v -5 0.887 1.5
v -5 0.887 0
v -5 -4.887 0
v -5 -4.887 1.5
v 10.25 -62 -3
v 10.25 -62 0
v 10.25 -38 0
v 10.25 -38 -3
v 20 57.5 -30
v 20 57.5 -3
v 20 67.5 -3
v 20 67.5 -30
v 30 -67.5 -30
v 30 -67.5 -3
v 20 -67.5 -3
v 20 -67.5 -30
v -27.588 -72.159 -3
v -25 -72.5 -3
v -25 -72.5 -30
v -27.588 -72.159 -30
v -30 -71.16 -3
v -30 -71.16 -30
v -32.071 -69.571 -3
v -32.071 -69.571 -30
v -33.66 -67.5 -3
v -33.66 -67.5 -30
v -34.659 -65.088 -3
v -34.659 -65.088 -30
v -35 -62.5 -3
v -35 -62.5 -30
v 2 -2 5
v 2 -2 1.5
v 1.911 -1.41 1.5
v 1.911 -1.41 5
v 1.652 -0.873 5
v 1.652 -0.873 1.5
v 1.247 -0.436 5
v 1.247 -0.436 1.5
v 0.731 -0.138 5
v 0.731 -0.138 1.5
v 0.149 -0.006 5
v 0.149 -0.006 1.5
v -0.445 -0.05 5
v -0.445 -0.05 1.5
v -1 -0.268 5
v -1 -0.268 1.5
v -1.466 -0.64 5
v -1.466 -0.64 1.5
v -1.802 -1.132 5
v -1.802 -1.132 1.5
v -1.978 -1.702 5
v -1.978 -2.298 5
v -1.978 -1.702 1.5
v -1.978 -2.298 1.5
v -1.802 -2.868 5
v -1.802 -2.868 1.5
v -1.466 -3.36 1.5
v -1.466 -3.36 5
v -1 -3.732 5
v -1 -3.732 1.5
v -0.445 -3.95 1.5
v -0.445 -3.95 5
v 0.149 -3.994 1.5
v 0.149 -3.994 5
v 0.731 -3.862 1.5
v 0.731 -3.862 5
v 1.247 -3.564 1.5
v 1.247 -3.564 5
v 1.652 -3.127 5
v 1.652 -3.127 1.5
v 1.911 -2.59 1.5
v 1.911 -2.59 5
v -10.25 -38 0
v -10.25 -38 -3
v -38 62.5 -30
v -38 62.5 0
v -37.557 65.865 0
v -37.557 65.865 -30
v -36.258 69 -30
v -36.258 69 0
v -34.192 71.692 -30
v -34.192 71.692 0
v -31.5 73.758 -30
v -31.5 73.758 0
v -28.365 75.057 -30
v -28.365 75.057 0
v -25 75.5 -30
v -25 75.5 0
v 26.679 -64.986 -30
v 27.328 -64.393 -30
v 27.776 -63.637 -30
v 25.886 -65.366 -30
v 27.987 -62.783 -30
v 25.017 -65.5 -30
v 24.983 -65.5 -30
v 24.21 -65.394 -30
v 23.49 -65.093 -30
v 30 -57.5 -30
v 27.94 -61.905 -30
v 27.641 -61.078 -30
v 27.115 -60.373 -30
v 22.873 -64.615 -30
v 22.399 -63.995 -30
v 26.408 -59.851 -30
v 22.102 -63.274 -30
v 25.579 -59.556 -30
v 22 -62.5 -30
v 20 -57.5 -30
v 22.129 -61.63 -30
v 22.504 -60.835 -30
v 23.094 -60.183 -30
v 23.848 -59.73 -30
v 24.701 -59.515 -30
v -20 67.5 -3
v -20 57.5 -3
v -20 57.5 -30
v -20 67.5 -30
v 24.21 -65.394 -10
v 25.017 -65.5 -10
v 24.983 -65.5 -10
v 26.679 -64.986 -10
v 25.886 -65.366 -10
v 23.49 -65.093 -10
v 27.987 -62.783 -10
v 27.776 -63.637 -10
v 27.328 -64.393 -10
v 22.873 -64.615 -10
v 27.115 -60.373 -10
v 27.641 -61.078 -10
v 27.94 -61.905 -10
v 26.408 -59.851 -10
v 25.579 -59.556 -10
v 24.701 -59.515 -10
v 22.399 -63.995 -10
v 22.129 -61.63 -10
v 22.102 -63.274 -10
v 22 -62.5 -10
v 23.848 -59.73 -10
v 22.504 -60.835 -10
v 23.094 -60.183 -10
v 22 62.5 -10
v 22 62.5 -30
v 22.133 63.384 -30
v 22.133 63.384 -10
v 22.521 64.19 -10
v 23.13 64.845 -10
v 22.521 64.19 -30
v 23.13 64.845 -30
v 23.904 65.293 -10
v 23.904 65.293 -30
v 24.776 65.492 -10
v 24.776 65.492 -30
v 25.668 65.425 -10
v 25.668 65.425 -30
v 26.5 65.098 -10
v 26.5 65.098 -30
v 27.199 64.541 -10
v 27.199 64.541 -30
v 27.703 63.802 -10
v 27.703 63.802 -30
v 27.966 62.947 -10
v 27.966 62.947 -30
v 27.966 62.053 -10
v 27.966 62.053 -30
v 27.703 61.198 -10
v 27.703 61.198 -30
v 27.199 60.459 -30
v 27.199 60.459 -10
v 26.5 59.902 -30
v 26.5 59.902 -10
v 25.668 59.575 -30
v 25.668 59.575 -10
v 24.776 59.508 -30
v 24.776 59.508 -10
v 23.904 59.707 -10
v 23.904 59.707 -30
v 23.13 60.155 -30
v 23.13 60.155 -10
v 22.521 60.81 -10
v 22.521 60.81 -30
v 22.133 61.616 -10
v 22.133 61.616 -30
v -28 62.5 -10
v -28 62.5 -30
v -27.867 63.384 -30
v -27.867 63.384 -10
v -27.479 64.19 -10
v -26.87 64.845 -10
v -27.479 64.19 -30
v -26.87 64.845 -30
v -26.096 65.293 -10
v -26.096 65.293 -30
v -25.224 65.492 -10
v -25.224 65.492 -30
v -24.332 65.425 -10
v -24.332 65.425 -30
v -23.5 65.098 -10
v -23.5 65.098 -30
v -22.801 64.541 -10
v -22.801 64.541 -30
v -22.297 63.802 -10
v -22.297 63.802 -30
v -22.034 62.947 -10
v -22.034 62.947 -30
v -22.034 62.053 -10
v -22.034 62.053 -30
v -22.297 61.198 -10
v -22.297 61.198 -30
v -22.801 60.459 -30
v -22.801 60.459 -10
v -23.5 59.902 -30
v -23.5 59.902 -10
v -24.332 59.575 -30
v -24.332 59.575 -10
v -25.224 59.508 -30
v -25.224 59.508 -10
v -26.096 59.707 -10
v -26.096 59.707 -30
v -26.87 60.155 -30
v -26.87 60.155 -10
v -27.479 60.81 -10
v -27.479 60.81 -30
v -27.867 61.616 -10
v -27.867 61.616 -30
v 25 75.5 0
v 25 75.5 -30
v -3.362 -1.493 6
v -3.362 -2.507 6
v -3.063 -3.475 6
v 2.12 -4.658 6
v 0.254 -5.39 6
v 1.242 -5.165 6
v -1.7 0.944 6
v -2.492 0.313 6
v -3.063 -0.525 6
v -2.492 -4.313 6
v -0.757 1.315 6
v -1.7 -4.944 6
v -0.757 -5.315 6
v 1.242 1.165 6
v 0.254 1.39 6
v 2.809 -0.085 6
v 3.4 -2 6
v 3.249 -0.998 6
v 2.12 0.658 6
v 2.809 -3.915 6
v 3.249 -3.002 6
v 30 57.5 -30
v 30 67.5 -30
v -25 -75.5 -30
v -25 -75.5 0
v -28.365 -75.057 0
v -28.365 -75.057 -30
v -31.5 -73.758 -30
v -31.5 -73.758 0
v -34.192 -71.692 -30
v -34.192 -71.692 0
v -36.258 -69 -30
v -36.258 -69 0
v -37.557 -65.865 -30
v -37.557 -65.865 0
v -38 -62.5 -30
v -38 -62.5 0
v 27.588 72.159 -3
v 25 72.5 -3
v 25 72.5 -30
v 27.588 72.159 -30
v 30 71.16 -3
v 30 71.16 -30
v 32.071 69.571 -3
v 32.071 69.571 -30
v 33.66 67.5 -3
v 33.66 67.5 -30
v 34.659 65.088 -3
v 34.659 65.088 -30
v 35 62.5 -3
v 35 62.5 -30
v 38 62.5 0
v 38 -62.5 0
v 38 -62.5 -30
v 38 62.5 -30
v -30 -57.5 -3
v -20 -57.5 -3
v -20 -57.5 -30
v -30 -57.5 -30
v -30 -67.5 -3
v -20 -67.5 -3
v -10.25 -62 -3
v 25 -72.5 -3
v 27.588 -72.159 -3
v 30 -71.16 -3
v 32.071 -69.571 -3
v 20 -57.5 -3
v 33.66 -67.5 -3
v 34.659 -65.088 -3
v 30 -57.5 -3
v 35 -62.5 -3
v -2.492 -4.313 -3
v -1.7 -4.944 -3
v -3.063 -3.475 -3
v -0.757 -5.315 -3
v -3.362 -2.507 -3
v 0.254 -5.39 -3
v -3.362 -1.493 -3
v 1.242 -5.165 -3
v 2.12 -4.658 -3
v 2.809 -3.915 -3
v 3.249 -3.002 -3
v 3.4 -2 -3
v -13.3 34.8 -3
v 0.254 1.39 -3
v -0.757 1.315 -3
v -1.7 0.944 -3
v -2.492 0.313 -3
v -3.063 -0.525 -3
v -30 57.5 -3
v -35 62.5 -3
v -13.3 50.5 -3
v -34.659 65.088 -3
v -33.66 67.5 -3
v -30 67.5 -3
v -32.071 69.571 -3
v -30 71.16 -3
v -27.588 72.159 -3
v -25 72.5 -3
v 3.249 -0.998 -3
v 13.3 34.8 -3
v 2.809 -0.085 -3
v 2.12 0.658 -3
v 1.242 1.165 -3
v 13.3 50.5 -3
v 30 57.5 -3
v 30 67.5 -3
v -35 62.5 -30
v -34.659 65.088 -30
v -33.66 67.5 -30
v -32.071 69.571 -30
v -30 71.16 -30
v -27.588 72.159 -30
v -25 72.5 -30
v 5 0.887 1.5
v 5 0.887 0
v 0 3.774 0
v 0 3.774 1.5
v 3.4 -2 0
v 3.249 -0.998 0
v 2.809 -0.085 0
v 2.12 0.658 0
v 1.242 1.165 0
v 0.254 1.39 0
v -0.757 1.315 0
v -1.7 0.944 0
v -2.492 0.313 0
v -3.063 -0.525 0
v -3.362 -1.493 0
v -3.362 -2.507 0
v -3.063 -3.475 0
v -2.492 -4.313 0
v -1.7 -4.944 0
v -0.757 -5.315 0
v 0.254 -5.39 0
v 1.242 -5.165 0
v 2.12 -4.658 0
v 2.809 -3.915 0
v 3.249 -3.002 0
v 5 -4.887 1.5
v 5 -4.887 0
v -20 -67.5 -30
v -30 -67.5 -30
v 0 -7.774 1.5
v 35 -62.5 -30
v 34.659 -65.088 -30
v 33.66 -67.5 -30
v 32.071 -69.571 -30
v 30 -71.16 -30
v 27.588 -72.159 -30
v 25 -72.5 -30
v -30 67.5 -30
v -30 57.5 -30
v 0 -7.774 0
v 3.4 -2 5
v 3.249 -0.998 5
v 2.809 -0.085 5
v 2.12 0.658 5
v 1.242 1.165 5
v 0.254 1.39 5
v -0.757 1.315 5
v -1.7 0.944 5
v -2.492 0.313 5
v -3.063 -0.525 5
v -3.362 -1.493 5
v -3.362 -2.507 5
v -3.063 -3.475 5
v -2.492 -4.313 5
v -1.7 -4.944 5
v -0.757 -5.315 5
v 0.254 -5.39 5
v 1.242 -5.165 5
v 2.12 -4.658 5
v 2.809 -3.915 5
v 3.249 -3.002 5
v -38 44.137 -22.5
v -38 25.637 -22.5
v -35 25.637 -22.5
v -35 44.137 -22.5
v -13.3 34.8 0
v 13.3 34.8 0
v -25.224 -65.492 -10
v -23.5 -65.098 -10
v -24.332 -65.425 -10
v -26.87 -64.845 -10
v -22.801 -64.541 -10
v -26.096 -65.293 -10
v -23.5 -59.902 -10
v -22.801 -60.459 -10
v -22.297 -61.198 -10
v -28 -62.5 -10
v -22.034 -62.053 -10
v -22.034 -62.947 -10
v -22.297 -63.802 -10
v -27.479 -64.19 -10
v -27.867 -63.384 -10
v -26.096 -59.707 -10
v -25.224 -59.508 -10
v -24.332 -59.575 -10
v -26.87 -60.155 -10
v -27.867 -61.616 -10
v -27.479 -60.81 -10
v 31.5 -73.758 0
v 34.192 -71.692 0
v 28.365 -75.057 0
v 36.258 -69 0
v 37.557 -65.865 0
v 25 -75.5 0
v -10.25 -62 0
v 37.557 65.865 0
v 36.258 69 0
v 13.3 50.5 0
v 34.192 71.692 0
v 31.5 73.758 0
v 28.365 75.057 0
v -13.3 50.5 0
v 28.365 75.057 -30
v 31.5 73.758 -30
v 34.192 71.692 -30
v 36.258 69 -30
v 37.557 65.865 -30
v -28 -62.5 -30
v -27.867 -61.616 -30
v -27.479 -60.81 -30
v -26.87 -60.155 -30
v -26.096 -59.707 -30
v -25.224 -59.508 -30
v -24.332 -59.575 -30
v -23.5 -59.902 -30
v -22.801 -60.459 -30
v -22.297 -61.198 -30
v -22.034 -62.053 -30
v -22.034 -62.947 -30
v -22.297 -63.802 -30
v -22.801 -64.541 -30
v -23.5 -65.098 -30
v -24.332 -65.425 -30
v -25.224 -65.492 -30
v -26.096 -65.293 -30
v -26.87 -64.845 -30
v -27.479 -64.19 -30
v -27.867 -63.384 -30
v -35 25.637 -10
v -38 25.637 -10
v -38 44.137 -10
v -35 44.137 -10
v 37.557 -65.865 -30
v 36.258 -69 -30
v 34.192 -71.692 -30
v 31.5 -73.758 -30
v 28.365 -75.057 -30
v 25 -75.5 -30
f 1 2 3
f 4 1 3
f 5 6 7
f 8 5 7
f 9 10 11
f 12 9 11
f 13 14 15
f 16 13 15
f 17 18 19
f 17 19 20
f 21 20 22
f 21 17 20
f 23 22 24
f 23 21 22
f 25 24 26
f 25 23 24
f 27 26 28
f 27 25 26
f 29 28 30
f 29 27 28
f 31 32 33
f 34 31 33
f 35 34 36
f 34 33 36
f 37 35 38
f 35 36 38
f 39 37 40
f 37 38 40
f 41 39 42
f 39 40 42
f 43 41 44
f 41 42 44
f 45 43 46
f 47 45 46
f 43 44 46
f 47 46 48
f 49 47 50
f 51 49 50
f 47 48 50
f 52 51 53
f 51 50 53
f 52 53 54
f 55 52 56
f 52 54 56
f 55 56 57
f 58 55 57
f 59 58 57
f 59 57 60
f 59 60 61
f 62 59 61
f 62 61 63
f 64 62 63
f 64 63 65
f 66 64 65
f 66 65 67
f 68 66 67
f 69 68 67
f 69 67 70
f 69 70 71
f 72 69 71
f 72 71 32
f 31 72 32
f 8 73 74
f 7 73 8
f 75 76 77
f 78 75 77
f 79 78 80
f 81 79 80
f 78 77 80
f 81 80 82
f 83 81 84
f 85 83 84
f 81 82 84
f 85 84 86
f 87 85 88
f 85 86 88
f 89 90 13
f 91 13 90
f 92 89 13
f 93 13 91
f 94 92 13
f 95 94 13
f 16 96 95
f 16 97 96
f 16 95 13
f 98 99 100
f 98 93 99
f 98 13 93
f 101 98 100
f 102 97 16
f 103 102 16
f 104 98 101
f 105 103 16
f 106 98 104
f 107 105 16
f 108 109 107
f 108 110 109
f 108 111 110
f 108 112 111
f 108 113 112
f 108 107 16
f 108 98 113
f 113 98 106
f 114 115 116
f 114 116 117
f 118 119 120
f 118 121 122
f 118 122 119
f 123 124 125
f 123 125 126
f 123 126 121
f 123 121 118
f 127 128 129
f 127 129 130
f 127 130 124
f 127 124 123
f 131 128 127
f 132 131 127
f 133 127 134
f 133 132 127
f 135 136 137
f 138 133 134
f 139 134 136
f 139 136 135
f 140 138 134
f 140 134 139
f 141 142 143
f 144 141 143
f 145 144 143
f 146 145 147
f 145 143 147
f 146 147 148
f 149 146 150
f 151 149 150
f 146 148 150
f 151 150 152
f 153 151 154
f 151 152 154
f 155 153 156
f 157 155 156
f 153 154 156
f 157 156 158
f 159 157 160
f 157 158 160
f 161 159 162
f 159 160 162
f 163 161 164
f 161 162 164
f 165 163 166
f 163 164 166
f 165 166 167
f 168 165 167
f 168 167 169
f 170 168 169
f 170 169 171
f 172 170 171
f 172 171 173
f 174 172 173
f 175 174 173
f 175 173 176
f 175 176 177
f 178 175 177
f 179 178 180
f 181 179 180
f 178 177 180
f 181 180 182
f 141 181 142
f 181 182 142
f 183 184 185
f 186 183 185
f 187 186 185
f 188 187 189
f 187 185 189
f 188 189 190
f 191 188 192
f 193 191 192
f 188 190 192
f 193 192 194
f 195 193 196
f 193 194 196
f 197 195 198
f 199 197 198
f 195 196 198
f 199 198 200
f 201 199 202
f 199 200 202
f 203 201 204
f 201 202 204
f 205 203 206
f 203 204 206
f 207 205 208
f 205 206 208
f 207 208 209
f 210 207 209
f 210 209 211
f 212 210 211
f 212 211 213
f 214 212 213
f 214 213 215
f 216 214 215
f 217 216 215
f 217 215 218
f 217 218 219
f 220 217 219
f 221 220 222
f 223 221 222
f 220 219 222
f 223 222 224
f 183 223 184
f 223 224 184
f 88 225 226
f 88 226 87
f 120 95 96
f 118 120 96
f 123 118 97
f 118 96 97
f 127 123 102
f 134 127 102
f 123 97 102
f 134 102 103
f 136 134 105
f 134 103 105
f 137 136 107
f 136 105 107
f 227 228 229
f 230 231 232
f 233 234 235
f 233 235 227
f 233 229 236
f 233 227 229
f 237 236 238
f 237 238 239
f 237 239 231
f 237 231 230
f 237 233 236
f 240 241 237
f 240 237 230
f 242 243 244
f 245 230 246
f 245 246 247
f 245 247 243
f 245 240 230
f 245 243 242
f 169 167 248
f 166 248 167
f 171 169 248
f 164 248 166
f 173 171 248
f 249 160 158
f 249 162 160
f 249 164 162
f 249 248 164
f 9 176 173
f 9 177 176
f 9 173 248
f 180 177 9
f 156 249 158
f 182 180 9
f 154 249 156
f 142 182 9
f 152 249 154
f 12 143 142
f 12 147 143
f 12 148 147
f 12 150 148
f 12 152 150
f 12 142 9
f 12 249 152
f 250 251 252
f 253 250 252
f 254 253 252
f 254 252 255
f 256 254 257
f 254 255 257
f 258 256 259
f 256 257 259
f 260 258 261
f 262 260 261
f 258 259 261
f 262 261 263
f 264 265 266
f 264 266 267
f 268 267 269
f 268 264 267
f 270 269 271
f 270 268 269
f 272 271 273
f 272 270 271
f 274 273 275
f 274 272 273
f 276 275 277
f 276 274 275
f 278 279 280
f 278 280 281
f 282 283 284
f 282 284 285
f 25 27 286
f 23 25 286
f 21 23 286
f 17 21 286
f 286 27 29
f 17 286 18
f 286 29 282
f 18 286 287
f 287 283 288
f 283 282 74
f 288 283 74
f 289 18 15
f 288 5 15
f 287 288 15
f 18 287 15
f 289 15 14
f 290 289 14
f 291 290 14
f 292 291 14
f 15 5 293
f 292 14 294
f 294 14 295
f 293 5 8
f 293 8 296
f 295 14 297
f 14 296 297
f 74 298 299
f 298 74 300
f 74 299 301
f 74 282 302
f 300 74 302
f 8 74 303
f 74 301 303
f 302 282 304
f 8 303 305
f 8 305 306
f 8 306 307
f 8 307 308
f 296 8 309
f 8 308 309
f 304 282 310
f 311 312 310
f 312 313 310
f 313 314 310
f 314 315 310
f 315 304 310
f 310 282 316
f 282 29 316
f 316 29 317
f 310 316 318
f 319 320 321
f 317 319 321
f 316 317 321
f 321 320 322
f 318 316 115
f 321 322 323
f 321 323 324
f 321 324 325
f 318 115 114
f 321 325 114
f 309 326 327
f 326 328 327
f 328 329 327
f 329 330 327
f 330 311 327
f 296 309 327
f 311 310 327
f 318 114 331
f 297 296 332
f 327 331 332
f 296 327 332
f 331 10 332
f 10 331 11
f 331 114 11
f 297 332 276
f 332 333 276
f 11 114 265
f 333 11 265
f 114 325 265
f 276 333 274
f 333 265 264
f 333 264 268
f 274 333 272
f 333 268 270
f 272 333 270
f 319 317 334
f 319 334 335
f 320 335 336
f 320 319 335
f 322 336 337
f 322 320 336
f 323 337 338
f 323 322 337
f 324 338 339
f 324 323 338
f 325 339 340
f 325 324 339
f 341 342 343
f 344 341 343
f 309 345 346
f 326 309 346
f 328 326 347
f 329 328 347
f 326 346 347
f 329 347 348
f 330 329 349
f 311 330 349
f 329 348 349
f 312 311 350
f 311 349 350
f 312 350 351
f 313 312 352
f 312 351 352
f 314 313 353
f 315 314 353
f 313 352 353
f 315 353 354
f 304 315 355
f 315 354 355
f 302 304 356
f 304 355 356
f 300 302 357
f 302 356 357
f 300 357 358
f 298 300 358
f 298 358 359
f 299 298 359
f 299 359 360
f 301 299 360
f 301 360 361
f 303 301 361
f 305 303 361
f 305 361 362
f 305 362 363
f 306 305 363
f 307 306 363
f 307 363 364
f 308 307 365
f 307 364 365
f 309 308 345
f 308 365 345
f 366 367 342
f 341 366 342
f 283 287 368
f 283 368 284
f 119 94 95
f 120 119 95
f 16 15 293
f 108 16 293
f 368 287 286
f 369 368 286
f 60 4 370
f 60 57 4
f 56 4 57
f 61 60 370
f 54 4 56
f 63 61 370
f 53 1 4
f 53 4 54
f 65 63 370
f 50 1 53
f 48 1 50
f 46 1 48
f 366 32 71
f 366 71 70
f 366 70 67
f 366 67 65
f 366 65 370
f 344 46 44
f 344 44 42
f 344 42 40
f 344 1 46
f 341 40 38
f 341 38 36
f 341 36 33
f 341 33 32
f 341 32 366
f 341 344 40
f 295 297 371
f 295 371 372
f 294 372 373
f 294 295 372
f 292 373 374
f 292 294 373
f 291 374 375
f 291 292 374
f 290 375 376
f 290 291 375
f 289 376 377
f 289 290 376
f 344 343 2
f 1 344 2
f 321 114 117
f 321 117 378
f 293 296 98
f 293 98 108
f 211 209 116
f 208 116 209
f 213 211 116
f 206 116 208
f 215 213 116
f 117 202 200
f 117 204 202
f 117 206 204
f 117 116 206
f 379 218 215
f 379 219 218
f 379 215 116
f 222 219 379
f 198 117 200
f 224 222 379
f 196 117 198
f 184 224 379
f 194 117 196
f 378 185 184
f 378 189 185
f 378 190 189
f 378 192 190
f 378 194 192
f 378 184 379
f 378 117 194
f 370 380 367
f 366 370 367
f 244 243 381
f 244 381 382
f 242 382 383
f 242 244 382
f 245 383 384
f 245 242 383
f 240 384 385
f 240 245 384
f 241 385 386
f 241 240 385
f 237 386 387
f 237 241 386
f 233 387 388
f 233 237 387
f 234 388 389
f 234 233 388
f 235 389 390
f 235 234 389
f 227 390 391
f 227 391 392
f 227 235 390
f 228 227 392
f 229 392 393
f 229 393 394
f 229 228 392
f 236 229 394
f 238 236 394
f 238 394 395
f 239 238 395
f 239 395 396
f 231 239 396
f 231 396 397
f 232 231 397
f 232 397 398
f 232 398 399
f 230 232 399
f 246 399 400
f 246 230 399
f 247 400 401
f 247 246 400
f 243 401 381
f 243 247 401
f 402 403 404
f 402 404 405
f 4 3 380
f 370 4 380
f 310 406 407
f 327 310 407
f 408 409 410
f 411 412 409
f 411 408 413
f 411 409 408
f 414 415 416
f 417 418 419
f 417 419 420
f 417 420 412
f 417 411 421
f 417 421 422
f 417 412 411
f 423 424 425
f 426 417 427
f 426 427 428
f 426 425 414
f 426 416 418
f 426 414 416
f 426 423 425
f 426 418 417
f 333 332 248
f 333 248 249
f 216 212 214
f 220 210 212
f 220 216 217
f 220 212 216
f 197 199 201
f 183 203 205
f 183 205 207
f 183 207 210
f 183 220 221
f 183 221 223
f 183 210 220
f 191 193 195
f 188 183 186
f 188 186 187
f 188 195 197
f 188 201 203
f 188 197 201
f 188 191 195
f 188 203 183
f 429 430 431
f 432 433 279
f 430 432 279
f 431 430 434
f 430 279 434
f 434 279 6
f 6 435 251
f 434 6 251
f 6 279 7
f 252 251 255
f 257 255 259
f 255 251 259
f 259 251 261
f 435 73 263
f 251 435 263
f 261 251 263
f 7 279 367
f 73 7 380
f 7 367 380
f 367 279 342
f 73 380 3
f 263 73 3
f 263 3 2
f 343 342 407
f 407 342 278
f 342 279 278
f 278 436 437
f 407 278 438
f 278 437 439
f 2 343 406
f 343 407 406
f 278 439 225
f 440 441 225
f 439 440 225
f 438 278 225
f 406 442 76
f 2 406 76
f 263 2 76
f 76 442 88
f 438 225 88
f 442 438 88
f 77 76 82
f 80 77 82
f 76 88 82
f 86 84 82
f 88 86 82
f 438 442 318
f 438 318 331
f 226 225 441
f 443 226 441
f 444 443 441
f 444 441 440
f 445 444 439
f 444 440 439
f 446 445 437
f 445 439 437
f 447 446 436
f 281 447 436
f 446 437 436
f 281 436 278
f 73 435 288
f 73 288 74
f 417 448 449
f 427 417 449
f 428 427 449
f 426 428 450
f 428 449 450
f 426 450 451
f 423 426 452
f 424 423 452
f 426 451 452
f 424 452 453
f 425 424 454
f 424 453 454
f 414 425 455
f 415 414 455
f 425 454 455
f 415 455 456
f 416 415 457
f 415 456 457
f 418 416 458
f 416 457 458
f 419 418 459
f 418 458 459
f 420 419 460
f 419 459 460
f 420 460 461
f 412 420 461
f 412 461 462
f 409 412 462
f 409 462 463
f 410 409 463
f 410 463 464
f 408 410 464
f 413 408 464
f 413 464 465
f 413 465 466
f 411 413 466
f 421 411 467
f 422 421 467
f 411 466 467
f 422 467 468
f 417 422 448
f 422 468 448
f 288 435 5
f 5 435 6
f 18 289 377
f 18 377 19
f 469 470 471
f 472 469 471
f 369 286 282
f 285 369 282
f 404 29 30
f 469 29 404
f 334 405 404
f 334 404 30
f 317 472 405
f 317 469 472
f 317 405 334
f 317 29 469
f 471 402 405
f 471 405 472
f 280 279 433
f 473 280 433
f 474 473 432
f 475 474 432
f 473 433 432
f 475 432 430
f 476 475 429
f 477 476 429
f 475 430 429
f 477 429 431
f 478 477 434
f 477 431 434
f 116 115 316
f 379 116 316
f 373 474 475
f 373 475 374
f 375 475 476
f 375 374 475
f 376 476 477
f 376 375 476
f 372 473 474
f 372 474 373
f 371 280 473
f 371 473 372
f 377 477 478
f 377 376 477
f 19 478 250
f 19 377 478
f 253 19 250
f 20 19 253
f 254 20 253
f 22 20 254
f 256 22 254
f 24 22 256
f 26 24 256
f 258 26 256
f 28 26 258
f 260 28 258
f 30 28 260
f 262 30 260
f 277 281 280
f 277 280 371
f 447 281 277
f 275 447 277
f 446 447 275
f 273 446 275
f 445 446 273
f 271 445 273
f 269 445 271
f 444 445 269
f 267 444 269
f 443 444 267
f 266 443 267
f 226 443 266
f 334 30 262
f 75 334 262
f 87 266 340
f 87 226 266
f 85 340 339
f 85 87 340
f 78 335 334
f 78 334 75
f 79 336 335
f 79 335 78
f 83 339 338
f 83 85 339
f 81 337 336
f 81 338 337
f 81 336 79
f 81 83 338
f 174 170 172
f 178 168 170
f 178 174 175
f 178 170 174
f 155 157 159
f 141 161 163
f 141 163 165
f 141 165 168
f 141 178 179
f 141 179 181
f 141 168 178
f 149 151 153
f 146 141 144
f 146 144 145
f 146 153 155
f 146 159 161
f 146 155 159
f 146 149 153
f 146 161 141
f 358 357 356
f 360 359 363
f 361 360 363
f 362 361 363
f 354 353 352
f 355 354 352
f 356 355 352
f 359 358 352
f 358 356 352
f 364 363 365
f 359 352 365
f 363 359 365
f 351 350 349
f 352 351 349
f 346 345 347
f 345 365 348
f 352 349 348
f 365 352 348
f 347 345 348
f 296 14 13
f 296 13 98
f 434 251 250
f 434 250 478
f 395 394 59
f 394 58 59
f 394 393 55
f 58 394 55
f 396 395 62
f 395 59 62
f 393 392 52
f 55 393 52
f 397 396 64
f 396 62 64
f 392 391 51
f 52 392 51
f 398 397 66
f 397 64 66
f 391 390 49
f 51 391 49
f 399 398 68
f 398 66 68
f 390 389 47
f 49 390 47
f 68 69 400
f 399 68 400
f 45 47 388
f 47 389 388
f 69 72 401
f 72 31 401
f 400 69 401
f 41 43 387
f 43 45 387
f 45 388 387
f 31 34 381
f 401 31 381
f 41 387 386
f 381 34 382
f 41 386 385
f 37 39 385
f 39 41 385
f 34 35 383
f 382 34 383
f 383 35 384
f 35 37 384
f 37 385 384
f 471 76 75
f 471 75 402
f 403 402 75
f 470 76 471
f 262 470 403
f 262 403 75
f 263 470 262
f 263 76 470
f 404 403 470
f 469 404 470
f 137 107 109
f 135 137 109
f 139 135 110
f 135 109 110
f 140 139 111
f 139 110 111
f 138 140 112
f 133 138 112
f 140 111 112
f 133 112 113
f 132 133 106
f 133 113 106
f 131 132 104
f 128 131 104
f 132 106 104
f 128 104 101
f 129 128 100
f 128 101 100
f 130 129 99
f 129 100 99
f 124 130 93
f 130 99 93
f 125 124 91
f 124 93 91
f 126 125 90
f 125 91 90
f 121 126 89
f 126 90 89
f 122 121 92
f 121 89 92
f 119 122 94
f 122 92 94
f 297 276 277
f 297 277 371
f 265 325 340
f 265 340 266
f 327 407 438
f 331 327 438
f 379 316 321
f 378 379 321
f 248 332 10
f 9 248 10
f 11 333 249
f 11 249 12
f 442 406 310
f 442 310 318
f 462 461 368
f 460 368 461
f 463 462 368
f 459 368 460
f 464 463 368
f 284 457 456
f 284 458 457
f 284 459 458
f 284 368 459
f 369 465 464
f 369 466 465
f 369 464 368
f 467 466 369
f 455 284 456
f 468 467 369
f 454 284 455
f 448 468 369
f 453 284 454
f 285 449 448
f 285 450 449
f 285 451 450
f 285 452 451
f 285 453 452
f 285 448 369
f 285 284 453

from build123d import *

# Parameters (mm, degrees)
BOSS_EXTRUDE1_DEPTH = 30
BOSS_EXTRUDE2_DEPTH = 3
SKETCH7_R           = 3.4
SKETCH7_W           = 26.6
SKETCH7_H           = 15.7
SKETCH7_W_2         = 20.5
SKETCH7_H_2         = 24
CUT_EXTRUDE1_DEPTH  = 3
SKETCH8_W           = 10
SKETCH8_H           = 10
BOSS_EXTRUDE3_DEPTH = 27
SKETCH9_R           = 3
CUT_EXTRUDE2_DEPTH  = 20
SKETCH10_W          = 12.5
SKETCH10_H          = 18.5
CUT_EXTRUDE3_DEPTH  = 10
BOSS_EXTRUDE4_DEPTH = 1.5
SKETCH14_R          = 2
BOSS_EXTRUDE5_DEPTH = 5
BOSS_EXTRUDE6_START = 1
SKETCH15_R          = 3.4
BOSS_EXTRUDE6_DEPTH = 1


with BuildPart() as part:
    # Sketch1 → Boss-Extrude1 (new body)
    with BuildSketch(Plane.XY):
        with BuildLine():
            Line((-25, 75.5), (25, 75.5))
            ThreePointArc((25, 75.5), (34.192388155, 71.692388155), (38, 62.5))
            Line((38, 62.5), (38, -62.5))
            ThreePointArc((38, -62.5), (34.192388155, -71.692388155), (25, -75.5))
            Line((25, -75.5), (-25, -75.5))
            ThreePointArc((-25, -75.5), (-34.192388155, -71.692388155), (-38, -62.5))
            Line((-38, -62.5), (-38, 62.5))
            ThreePointArc((-38, 62.5), (-34.192388155, 71.692388155), (-25, 75.5))
        make_face()
        with BuildLine():
            Line((-25, 72.5), (25, 72.5))
            ThreePointArc((25, 72.5), (32.071067812, 69.571067812), (35, 62.5))
            Line((35, 62.5), (35, -62.5))
            ThreePointArc((35, -62.5), (32.071067812, -69.571067812), (25, -72.5))
            Line((25, -72.5), (-25, -72.5))
            ThreePointArc((-25, -72.5), (-32.071067812, -69.571067812), (-35, -62.5))
            Line((-35, -62.5), (-35, 62.5))
            ThreePointArc((-35, 62.5), (-32.071067812, 69.571067812), (-25, 72.5))
        make_face(mode=Mode.SUBTRACT)
    extrude(amount=-BOSS_EXTRUDE1_DEPTH)

    # Sketch6 → Boss-Extrude2 (add)
    with BuildSketch(Plane.XY):
        with BuildLine():
            Line((-23, -75.5), (23, -75.5))
            ThreePointArc((23, -75.5), (33.606601718, -71.106601718), (38, -60.5))
            Line((38, -60.5), (38, 60.5))
            ThreePointArc((38, 60.5), (33.606601718, 71.106601718), (23, 75.5))
            Line((23, 75.5), (-23, 75.5))
            ThreePointArc((-23, 75.5), (-33.606601718, 71.106601718), (-38, 60.5))
            Line((-38, 60.5), (-38, -60.5))
            ThreePointArc((-38, -60.5), (-33.606601718, -71.106601718), (-23, -75.5))
        make_face()
    extrude(amount=-BOSS_EXTRUDE2_DEPTH)

    # Sketch7 → Cut-Extrude1 (cut)
    with BuildSketch(Plane.XY):
        with Locations((0, -2)):
            Circle(SKETCH7_R)
        with Locations((0, 42.65)):
            Rectangle(SKETCH7_W, SKETCH7_H)
        with Locations((0, -50)):
            Rectangle(SKETCH7_W_2, SKETCH7_H_2)
    extrude(amount=-CUT_EXTRUDE1_DEPTH, mode=Mode.SUBTRACT)

    # Sketch8 → Boss-Extrude3 (add)
    with BuildSketch(Plane(origin=(0, 0, -3), x_dir=(-1, 0, 0), z_dir=(0, 0, -1))):
        with Locations((-25, 62.5)):
            Rectangle(SKETCH8_W, SKETCH8_H)
        with Locations((25, 62.5)):
            Rectangle(SKETCH8_W, SKETCH8_H)
        with Locations((25, -62.5)):
            Rectangle(SKETCH8_W, SKETCH8_H)
        with Locations((-25, -62.5)):
            Rectangle(SKETCH8_W, SKETCH8_H)
    extrude(amount=BOSS_EXTRUDE3_DEPTH)

    # Sketch9 → Cut-Extrude2 (cut)
    with BuildSketch(Plane(origin=(0, 0, -30), x_dir=(-1, 0, 0), z_dir=(0, 0, -1))):
        with Locations((-25, 62.5)):
            Circle(SKETCH9_R)
        with Locations((25, 62.5)):
            Circle(SKETCH9_R)
        with BuildLine():
            Line((-25.016555193, -65.499954321), (-24.983444807, -65.499954321))
            ThreePointArc((-24.983444807, -65.499954321), (-22.872834565, -64.615459102), (-22, -62.5))
            ThreePointArc((-22, -62.5), (-27.115459102, -60.372834565), (-25.016555193, -65.499954321))
        make_face()
        with Locations((25, -62.5)):
            Circle(SKETCH9_R)
    extrude(amount=-CUT_EXTRUDE2_DEPTH, mode=Mode.SUBTRACT)

    # Sketch10 → Cut-Extrude3 (cut)
    with BuildSketch(Plane.ZY.offset(38)):
        with Locations((-16.25, 34.886787821)):
            Rectangle(SKETCH10_W, SKETCH10_H)
    extrude(amount=-CUT_EXTRUDE3_DEPTH, mode=Mode.SUBTRACT)

    # Sketch12 → Boss-Extrude4 (add)
    with BuildSketch(Plane.XY):
        Polygon((5, -4.886751346), (5, 0.886751346), (0, 3.773502692), (-5, 0.886751346), (-5, -4.886751346), (0, -7.773502692), align=None)
    extrude(amount=BOSS_EXTRUDE4_DEPTH)

    # Sketch14 → Boss-Extrude5 (add)
    with BuildSketch(Plane.XY):
        with Locations((0, -2)):
            Circle(SKETCH14_R)
    extrude(amount=BOSS_EXTRUDE5_DEPTH)

    # Sketch15 → Boss-Extrude6 (add)
    with BuildSketch(Plane.XY.offset(5).offset(BOSS_EXTRUDE6_START)):
        with Locations((0, -2)):
            Circle(SKETCH15_R)
    extrude(amount=-BOSS_EXTRUDE6_DEPTH)


solid = part.part
